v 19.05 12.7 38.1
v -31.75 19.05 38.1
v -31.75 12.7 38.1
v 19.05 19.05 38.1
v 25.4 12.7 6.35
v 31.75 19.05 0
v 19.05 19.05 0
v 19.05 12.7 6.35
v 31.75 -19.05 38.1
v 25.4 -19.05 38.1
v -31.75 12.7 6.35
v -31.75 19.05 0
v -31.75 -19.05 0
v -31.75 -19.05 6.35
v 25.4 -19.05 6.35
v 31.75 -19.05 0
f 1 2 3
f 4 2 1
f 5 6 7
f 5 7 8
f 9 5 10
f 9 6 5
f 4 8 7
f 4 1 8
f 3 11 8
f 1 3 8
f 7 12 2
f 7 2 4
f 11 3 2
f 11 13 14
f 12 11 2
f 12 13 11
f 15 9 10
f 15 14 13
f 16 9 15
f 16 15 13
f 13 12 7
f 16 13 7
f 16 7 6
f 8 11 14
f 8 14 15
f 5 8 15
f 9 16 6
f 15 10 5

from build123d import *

# Parameters (mm, degrees)
F0_W     = 63.5
F0_H     = 38.1
F1_DEPTH = 6.35
F2_W     = 50.8
F2_H     = 6.35
F3_DEPTH = 31.75
F5_DEPTH = 6.35
F7_DEPTH = 12.7


with BuildPart() as f1:
    # F0 (on Top) → F1 (new body)
    with BuildSketch(Plane.XY):
        Rectangle(F0_W, F0_H)
    extrude(amount=F1_DEPTH)

    # F2 (on face) → F3 (join)
    with BuildSketch(Plane.XY.offset(6.35)):
        with Locations((-6.35, 15.875)):
            Rectangle(F2_W, F2_H)
    extrude(amount=F3_DEPTH)

    # F4 (on face) → F5 (join)
    with BuildSketch(Plane.YZ.offset(31.75)):
        Polygon((-19.05, 6.35), (12.7, 6.35), (-19.05, 38.1), align=None)
    extrude(amount=-F5_DEPTH)

    # F6 (on face) → F7 (cut)
    with BuildSketch(Plane.YZ.offset(31.75)):
        Polygon((19.05, 6.35), (12.7, 6.35), (19.05, 0), align=None)
    extrude(amount=-F7_DEPTH, mode=Mode.SUBTRACT)


solid = f1.part
